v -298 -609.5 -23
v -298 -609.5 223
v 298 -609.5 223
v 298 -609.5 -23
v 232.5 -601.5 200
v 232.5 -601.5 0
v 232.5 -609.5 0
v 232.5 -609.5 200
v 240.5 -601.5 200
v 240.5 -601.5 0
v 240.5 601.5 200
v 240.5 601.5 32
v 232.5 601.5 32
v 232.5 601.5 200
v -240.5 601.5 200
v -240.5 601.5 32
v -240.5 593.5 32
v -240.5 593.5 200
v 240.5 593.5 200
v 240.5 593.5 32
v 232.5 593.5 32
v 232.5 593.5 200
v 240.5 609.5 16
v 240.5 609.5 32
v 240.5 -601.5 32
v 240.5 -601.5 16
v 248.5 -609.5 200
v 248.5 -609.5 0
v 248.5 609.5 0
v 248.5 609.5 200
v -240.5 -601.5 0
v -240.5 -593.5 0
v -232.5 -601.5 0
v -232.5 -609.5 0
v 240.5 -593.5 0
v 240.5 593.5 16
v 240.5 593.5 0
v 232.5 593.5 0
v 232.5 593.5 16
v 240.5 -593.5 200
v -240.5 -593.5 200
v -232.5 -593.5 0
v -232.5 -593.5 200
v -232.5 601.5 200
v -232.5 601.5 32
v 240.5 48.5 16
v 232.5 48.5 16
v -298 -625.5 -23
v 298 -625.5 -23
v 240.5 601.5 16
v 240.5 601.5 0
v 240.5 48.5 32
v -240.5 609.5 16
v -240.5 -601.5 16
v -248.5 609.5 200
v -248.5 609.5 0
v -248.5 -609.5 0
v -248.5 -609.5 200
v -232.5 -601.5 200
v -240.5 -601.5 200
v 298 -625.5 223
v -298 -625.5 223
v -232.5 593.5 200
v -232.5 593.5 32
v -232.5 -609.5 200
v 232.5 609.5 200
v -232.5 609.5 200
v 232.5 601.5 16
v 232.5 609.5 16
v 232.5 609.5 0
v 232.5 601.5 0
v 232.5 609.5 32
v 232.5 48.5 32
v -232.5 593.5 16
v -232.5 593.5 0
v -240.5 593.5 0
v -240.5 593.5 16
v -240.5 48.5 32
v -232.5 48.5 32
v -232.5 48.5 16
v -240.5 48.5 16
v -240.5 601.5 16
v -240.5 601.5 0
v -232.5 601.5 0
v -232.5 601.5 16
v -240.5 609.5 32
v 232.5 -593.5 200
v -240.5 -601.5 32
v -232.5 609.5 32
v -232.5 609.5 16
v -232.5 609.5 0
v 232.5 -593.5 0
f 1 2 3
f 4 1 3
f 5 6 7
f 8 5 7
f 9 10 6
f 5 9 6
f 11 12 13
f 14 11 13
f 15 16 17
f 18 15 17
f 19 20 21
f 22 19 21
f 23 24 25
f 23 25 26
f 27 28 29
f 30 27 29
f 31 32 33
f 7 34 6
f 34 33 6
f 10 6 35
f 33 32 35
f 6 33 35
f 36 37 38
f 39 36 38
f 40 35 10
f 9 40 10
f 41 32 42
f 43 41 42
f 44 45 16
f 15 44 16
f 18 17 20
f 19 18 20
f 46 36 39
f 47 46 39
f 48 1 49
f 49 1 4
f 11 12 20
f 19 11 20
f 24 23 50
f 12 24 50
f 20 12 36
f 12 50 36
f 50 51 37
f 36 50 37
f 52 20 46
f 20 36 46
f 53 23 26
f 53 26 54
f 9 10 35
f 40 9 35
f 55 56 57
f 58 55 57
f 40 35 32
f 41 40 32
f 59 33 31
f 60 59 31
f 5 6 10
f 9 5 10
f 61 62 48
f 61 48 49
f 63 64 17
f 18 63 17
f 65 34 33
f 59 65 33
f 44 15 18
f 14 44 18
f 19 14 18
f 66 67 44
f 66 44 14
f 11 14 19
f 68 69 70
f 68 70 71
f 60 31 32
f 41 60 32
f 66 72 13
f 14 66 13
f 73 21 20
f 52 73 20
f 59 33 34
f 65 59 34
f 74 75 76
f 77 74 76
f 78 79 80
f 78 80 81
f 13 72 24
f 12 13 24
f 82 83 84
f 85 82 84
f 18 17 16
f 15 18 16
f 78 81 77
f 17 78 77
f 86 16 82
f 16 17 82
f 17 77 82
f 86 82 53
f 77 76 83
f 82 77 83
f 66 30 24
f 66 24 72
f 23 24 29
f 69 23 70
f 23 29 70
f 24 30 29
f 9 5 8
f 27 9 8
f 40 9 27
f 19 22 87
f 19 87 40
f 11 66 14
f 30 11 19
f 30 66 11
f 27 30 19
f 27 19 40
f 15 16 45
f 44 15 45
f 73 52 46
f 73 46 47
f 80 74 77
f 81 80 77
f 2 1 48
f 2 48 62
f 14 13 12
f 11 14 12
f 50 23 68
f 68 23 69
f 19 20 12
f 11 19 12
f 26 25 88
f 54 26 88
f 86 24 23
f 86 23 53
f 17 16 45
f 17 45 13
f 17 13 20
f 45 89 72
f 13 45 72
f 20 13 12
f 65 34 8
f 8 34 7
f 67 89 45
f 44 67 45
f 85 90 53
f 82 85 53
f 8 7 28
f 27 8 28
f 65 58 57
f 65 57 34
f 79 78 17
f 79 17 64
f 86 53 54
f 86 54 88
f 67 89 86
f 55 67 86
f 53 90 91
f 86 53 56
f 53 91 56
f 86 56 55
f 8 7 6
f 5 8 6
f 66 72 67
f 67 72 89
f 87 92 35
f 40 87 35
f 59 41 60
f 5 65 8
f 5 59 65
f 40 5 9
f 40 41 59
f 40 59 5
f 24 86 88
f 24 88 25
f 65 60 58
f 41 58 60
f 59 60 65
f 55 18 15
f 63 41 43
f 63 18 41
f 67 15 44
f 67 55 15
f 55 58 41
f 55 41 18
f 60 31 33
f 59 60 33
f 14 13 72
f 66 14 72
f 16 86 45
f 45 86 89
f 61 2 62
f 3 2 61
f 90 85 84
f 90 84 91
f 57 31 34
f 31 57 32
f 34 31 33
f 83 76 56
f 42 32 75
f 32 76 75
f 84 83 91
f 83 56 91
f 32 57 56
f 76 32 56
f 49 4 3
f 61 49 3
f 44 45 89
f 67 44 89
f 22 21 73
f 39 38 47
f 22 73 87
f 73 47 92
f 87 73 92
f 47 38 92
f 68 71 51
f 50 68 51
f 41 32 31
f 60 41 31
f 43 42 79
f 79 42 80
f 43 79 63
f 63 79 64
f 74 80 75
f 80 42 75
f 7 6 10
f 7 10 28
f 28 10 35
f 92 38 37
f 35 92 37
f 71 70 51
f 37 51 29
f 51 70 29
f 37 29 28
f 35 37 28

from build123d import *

# Parameters (mm, degrees)
F1_DEPTH  = 200
F2_DEPTH  = 200
F3_DEPTH  = 200
F4_DEPTH  = 200
F5_DEPTH  = 32
F7_DEPTH  = 561
F9_DEPTH  = 1211
F10_W     = 596
F10_H     = 246
F10_W_2   = 465.0000002384
F10_H_2   = 200
F10_W_3   = 16
F10_W_4   = 15.9999997616
F11_DEPTH = 16


with BuildPart() as f1:
    # F0 (on Top) → F1 (new body)
    with BuildSketch(Plane.XY):
        Polygon((-248.5, -609.5), (-232.5000002384, -609.5), (-232.5000002384, -601.5000002384), (-240.5000002384, -601.5000002384), (-240.5000002384, -593.5000002384), (-232.5000002384, -593.5000002384), (-232.5000002384, 593.5000002384), (-240.5000002384, 593.5000002384), (-240.5000002384, 601.5000002384), (-232.5000002384, 601.5000002384), (-232.5000002384, 609.5), (-248.5, 609.5), align=None)
    extrude(amount=F1_DEPTH)


with BuildPart() as f2:
    # F0 (on Top) → F2 (new body)
    with BuildSketch(Plane.XY):
        Polygon((232.5, -609.5), (248.5, -609.5), (248.5, 609.5), (232.5, 609.5), (232.5, 601.5000002384), (240.5, 601.5000002384), (240.5, 593.5000002384), (232.5, 593.5000002384), (232.5, -593.5000002384), (240.5, -593.5000002384), (240.5, -601.5000002384), (232.5, -601.5000002384), align=None)
    extrude(amount=F2_DEPTH)


with BuildPart() as f3:
    # F0 (on Top) → F3 (new body)
    with BuildSketch(Plane.XY):
        Polygon((232.5, 601.5000002384), (232.5, 609.5), (-232.5000002384, 609.5), (-232.5000002384, 601.5000002384), (-240.5000002384, 601.5000002384), (-240.5000002384, 593.5000002384), (-232.5000002384, 593.5000002384), (232.5, 593.5000002384), (240.5, 593.5000002384), (240.5, 601.5000002384), align=None)
    extrude(amount=F3_DEPTH)

    # F0 (on Top) → F5 (cut)
    with BuildSketch(Plane.XY):
        Polygon((232.5, 601.5000002384), (232.5, 609.5), (-232.5000002384, 609.5), (-232.5000002384, 601.5000002384), (-240.5000002384, 601.5000002384), (-240.5000002384, 593.5000002384), (-232.5000002384, 593.5000002384), (232.5, 593.5000002384), (240.5, 593.5000002384), (240.5, 601.5000002384), align=None)
    extrude(amount=F5_DEPTH, mode=Mode.SUBTRACT)


with BuildPart() as f4:
    # F0 (on Top) → F4 (new body)
    with BuildSketch(Plane.XY):
        Polygon((-232.5000002384, -609.5), (232.5, -609.5), (232.5, -601.5000002384), (240.5, -601.5000002384), (240.5, -593.5000002384), (232.5, -593.5000002384), (-232.5000002384, -593.5000002384), (-240.5000002384, -593.5000002384), (-240.5000002384, -601.5000002384), (-232.5000002384, -601.5000002384), align=None)
    extrude(amount=F4_DEPTH)


with BuildPart() as f7:
    # F6 (on face) → F7 (new body)
    with BuildSketch(Plane(origin=(0, 609.5, 0), x_dir=(-1, 0, 0), z_dir=(0, 1, 0))):
        Polygon((-232.5, 32), (-240.5, 32), (-240.5, 16), (240.5000002384, 16), (240.5000002384, 32), (232.5000002384, 32), align=None)
    extrude(amount=-F7_DEPTH)


with BuildPart() as f2_1:
    add(f2.part)

    # F8: cut F7
    add(f7.part, mode=Mode.SUBTRACT)


with BuildPart() as f1_1:
    add(f1.part)

    # F8: cut F7
    add(f7.part, mode=Mode.SUBTRACT)


with BuildPart() as f4_1:
    add(f4.part)

    # F8: cut F7
    add(f7.part, mode=Mode.SUBTRACT)


with BuildPart() as f9:
    # F6 (on face) → F9 (new body)
    with BuildSketch(Plane(origin=(0, 609.5, 0), x_dir=(-1, 0, 0), z_dir=(0, 1, 0))):
        Polygon((-232.5, 32), (-240.5, 32), (-240.5, 16), (240.5000002384, 16), (240.5000002384, 32), (232.5000002384, 32), align=None)
    extrude(amount=-F9_DEPTH)


with BuildPart() as f11:
    # F10 (on face) → F11 (new body)
    with BuildSketch(Plane.XZ.offset(609.5)):
        with Locations((0, 100)):
            Rectangle(F10_W, F10_H)
        Polygon((-248.5, 0), (-248.5, 200), (-232.5000002384, 200), (232.5, 200), (248.5, 200), (248.5, 0), (232.5, 0), (-232.5000002384, 0), align=None, mode=Mode.SUBTRACT)
        with Locations((-1.192e-07, 100)):
            Rectangle(F10_W_2, F10_H_2)
        with Locations((240.5, 100)):
            Rectangle(F10_W_3, F10_H_2)
        with Locations((-240.5000001192, 100)):
            Rectangle(F10_W_4, F10_H_2)
    extrude(amount=F11_DEPTH)


solid = Compound([f3.part, f2_1.part, f1_1.part, f4_1.part, f9.part, f11.part])
